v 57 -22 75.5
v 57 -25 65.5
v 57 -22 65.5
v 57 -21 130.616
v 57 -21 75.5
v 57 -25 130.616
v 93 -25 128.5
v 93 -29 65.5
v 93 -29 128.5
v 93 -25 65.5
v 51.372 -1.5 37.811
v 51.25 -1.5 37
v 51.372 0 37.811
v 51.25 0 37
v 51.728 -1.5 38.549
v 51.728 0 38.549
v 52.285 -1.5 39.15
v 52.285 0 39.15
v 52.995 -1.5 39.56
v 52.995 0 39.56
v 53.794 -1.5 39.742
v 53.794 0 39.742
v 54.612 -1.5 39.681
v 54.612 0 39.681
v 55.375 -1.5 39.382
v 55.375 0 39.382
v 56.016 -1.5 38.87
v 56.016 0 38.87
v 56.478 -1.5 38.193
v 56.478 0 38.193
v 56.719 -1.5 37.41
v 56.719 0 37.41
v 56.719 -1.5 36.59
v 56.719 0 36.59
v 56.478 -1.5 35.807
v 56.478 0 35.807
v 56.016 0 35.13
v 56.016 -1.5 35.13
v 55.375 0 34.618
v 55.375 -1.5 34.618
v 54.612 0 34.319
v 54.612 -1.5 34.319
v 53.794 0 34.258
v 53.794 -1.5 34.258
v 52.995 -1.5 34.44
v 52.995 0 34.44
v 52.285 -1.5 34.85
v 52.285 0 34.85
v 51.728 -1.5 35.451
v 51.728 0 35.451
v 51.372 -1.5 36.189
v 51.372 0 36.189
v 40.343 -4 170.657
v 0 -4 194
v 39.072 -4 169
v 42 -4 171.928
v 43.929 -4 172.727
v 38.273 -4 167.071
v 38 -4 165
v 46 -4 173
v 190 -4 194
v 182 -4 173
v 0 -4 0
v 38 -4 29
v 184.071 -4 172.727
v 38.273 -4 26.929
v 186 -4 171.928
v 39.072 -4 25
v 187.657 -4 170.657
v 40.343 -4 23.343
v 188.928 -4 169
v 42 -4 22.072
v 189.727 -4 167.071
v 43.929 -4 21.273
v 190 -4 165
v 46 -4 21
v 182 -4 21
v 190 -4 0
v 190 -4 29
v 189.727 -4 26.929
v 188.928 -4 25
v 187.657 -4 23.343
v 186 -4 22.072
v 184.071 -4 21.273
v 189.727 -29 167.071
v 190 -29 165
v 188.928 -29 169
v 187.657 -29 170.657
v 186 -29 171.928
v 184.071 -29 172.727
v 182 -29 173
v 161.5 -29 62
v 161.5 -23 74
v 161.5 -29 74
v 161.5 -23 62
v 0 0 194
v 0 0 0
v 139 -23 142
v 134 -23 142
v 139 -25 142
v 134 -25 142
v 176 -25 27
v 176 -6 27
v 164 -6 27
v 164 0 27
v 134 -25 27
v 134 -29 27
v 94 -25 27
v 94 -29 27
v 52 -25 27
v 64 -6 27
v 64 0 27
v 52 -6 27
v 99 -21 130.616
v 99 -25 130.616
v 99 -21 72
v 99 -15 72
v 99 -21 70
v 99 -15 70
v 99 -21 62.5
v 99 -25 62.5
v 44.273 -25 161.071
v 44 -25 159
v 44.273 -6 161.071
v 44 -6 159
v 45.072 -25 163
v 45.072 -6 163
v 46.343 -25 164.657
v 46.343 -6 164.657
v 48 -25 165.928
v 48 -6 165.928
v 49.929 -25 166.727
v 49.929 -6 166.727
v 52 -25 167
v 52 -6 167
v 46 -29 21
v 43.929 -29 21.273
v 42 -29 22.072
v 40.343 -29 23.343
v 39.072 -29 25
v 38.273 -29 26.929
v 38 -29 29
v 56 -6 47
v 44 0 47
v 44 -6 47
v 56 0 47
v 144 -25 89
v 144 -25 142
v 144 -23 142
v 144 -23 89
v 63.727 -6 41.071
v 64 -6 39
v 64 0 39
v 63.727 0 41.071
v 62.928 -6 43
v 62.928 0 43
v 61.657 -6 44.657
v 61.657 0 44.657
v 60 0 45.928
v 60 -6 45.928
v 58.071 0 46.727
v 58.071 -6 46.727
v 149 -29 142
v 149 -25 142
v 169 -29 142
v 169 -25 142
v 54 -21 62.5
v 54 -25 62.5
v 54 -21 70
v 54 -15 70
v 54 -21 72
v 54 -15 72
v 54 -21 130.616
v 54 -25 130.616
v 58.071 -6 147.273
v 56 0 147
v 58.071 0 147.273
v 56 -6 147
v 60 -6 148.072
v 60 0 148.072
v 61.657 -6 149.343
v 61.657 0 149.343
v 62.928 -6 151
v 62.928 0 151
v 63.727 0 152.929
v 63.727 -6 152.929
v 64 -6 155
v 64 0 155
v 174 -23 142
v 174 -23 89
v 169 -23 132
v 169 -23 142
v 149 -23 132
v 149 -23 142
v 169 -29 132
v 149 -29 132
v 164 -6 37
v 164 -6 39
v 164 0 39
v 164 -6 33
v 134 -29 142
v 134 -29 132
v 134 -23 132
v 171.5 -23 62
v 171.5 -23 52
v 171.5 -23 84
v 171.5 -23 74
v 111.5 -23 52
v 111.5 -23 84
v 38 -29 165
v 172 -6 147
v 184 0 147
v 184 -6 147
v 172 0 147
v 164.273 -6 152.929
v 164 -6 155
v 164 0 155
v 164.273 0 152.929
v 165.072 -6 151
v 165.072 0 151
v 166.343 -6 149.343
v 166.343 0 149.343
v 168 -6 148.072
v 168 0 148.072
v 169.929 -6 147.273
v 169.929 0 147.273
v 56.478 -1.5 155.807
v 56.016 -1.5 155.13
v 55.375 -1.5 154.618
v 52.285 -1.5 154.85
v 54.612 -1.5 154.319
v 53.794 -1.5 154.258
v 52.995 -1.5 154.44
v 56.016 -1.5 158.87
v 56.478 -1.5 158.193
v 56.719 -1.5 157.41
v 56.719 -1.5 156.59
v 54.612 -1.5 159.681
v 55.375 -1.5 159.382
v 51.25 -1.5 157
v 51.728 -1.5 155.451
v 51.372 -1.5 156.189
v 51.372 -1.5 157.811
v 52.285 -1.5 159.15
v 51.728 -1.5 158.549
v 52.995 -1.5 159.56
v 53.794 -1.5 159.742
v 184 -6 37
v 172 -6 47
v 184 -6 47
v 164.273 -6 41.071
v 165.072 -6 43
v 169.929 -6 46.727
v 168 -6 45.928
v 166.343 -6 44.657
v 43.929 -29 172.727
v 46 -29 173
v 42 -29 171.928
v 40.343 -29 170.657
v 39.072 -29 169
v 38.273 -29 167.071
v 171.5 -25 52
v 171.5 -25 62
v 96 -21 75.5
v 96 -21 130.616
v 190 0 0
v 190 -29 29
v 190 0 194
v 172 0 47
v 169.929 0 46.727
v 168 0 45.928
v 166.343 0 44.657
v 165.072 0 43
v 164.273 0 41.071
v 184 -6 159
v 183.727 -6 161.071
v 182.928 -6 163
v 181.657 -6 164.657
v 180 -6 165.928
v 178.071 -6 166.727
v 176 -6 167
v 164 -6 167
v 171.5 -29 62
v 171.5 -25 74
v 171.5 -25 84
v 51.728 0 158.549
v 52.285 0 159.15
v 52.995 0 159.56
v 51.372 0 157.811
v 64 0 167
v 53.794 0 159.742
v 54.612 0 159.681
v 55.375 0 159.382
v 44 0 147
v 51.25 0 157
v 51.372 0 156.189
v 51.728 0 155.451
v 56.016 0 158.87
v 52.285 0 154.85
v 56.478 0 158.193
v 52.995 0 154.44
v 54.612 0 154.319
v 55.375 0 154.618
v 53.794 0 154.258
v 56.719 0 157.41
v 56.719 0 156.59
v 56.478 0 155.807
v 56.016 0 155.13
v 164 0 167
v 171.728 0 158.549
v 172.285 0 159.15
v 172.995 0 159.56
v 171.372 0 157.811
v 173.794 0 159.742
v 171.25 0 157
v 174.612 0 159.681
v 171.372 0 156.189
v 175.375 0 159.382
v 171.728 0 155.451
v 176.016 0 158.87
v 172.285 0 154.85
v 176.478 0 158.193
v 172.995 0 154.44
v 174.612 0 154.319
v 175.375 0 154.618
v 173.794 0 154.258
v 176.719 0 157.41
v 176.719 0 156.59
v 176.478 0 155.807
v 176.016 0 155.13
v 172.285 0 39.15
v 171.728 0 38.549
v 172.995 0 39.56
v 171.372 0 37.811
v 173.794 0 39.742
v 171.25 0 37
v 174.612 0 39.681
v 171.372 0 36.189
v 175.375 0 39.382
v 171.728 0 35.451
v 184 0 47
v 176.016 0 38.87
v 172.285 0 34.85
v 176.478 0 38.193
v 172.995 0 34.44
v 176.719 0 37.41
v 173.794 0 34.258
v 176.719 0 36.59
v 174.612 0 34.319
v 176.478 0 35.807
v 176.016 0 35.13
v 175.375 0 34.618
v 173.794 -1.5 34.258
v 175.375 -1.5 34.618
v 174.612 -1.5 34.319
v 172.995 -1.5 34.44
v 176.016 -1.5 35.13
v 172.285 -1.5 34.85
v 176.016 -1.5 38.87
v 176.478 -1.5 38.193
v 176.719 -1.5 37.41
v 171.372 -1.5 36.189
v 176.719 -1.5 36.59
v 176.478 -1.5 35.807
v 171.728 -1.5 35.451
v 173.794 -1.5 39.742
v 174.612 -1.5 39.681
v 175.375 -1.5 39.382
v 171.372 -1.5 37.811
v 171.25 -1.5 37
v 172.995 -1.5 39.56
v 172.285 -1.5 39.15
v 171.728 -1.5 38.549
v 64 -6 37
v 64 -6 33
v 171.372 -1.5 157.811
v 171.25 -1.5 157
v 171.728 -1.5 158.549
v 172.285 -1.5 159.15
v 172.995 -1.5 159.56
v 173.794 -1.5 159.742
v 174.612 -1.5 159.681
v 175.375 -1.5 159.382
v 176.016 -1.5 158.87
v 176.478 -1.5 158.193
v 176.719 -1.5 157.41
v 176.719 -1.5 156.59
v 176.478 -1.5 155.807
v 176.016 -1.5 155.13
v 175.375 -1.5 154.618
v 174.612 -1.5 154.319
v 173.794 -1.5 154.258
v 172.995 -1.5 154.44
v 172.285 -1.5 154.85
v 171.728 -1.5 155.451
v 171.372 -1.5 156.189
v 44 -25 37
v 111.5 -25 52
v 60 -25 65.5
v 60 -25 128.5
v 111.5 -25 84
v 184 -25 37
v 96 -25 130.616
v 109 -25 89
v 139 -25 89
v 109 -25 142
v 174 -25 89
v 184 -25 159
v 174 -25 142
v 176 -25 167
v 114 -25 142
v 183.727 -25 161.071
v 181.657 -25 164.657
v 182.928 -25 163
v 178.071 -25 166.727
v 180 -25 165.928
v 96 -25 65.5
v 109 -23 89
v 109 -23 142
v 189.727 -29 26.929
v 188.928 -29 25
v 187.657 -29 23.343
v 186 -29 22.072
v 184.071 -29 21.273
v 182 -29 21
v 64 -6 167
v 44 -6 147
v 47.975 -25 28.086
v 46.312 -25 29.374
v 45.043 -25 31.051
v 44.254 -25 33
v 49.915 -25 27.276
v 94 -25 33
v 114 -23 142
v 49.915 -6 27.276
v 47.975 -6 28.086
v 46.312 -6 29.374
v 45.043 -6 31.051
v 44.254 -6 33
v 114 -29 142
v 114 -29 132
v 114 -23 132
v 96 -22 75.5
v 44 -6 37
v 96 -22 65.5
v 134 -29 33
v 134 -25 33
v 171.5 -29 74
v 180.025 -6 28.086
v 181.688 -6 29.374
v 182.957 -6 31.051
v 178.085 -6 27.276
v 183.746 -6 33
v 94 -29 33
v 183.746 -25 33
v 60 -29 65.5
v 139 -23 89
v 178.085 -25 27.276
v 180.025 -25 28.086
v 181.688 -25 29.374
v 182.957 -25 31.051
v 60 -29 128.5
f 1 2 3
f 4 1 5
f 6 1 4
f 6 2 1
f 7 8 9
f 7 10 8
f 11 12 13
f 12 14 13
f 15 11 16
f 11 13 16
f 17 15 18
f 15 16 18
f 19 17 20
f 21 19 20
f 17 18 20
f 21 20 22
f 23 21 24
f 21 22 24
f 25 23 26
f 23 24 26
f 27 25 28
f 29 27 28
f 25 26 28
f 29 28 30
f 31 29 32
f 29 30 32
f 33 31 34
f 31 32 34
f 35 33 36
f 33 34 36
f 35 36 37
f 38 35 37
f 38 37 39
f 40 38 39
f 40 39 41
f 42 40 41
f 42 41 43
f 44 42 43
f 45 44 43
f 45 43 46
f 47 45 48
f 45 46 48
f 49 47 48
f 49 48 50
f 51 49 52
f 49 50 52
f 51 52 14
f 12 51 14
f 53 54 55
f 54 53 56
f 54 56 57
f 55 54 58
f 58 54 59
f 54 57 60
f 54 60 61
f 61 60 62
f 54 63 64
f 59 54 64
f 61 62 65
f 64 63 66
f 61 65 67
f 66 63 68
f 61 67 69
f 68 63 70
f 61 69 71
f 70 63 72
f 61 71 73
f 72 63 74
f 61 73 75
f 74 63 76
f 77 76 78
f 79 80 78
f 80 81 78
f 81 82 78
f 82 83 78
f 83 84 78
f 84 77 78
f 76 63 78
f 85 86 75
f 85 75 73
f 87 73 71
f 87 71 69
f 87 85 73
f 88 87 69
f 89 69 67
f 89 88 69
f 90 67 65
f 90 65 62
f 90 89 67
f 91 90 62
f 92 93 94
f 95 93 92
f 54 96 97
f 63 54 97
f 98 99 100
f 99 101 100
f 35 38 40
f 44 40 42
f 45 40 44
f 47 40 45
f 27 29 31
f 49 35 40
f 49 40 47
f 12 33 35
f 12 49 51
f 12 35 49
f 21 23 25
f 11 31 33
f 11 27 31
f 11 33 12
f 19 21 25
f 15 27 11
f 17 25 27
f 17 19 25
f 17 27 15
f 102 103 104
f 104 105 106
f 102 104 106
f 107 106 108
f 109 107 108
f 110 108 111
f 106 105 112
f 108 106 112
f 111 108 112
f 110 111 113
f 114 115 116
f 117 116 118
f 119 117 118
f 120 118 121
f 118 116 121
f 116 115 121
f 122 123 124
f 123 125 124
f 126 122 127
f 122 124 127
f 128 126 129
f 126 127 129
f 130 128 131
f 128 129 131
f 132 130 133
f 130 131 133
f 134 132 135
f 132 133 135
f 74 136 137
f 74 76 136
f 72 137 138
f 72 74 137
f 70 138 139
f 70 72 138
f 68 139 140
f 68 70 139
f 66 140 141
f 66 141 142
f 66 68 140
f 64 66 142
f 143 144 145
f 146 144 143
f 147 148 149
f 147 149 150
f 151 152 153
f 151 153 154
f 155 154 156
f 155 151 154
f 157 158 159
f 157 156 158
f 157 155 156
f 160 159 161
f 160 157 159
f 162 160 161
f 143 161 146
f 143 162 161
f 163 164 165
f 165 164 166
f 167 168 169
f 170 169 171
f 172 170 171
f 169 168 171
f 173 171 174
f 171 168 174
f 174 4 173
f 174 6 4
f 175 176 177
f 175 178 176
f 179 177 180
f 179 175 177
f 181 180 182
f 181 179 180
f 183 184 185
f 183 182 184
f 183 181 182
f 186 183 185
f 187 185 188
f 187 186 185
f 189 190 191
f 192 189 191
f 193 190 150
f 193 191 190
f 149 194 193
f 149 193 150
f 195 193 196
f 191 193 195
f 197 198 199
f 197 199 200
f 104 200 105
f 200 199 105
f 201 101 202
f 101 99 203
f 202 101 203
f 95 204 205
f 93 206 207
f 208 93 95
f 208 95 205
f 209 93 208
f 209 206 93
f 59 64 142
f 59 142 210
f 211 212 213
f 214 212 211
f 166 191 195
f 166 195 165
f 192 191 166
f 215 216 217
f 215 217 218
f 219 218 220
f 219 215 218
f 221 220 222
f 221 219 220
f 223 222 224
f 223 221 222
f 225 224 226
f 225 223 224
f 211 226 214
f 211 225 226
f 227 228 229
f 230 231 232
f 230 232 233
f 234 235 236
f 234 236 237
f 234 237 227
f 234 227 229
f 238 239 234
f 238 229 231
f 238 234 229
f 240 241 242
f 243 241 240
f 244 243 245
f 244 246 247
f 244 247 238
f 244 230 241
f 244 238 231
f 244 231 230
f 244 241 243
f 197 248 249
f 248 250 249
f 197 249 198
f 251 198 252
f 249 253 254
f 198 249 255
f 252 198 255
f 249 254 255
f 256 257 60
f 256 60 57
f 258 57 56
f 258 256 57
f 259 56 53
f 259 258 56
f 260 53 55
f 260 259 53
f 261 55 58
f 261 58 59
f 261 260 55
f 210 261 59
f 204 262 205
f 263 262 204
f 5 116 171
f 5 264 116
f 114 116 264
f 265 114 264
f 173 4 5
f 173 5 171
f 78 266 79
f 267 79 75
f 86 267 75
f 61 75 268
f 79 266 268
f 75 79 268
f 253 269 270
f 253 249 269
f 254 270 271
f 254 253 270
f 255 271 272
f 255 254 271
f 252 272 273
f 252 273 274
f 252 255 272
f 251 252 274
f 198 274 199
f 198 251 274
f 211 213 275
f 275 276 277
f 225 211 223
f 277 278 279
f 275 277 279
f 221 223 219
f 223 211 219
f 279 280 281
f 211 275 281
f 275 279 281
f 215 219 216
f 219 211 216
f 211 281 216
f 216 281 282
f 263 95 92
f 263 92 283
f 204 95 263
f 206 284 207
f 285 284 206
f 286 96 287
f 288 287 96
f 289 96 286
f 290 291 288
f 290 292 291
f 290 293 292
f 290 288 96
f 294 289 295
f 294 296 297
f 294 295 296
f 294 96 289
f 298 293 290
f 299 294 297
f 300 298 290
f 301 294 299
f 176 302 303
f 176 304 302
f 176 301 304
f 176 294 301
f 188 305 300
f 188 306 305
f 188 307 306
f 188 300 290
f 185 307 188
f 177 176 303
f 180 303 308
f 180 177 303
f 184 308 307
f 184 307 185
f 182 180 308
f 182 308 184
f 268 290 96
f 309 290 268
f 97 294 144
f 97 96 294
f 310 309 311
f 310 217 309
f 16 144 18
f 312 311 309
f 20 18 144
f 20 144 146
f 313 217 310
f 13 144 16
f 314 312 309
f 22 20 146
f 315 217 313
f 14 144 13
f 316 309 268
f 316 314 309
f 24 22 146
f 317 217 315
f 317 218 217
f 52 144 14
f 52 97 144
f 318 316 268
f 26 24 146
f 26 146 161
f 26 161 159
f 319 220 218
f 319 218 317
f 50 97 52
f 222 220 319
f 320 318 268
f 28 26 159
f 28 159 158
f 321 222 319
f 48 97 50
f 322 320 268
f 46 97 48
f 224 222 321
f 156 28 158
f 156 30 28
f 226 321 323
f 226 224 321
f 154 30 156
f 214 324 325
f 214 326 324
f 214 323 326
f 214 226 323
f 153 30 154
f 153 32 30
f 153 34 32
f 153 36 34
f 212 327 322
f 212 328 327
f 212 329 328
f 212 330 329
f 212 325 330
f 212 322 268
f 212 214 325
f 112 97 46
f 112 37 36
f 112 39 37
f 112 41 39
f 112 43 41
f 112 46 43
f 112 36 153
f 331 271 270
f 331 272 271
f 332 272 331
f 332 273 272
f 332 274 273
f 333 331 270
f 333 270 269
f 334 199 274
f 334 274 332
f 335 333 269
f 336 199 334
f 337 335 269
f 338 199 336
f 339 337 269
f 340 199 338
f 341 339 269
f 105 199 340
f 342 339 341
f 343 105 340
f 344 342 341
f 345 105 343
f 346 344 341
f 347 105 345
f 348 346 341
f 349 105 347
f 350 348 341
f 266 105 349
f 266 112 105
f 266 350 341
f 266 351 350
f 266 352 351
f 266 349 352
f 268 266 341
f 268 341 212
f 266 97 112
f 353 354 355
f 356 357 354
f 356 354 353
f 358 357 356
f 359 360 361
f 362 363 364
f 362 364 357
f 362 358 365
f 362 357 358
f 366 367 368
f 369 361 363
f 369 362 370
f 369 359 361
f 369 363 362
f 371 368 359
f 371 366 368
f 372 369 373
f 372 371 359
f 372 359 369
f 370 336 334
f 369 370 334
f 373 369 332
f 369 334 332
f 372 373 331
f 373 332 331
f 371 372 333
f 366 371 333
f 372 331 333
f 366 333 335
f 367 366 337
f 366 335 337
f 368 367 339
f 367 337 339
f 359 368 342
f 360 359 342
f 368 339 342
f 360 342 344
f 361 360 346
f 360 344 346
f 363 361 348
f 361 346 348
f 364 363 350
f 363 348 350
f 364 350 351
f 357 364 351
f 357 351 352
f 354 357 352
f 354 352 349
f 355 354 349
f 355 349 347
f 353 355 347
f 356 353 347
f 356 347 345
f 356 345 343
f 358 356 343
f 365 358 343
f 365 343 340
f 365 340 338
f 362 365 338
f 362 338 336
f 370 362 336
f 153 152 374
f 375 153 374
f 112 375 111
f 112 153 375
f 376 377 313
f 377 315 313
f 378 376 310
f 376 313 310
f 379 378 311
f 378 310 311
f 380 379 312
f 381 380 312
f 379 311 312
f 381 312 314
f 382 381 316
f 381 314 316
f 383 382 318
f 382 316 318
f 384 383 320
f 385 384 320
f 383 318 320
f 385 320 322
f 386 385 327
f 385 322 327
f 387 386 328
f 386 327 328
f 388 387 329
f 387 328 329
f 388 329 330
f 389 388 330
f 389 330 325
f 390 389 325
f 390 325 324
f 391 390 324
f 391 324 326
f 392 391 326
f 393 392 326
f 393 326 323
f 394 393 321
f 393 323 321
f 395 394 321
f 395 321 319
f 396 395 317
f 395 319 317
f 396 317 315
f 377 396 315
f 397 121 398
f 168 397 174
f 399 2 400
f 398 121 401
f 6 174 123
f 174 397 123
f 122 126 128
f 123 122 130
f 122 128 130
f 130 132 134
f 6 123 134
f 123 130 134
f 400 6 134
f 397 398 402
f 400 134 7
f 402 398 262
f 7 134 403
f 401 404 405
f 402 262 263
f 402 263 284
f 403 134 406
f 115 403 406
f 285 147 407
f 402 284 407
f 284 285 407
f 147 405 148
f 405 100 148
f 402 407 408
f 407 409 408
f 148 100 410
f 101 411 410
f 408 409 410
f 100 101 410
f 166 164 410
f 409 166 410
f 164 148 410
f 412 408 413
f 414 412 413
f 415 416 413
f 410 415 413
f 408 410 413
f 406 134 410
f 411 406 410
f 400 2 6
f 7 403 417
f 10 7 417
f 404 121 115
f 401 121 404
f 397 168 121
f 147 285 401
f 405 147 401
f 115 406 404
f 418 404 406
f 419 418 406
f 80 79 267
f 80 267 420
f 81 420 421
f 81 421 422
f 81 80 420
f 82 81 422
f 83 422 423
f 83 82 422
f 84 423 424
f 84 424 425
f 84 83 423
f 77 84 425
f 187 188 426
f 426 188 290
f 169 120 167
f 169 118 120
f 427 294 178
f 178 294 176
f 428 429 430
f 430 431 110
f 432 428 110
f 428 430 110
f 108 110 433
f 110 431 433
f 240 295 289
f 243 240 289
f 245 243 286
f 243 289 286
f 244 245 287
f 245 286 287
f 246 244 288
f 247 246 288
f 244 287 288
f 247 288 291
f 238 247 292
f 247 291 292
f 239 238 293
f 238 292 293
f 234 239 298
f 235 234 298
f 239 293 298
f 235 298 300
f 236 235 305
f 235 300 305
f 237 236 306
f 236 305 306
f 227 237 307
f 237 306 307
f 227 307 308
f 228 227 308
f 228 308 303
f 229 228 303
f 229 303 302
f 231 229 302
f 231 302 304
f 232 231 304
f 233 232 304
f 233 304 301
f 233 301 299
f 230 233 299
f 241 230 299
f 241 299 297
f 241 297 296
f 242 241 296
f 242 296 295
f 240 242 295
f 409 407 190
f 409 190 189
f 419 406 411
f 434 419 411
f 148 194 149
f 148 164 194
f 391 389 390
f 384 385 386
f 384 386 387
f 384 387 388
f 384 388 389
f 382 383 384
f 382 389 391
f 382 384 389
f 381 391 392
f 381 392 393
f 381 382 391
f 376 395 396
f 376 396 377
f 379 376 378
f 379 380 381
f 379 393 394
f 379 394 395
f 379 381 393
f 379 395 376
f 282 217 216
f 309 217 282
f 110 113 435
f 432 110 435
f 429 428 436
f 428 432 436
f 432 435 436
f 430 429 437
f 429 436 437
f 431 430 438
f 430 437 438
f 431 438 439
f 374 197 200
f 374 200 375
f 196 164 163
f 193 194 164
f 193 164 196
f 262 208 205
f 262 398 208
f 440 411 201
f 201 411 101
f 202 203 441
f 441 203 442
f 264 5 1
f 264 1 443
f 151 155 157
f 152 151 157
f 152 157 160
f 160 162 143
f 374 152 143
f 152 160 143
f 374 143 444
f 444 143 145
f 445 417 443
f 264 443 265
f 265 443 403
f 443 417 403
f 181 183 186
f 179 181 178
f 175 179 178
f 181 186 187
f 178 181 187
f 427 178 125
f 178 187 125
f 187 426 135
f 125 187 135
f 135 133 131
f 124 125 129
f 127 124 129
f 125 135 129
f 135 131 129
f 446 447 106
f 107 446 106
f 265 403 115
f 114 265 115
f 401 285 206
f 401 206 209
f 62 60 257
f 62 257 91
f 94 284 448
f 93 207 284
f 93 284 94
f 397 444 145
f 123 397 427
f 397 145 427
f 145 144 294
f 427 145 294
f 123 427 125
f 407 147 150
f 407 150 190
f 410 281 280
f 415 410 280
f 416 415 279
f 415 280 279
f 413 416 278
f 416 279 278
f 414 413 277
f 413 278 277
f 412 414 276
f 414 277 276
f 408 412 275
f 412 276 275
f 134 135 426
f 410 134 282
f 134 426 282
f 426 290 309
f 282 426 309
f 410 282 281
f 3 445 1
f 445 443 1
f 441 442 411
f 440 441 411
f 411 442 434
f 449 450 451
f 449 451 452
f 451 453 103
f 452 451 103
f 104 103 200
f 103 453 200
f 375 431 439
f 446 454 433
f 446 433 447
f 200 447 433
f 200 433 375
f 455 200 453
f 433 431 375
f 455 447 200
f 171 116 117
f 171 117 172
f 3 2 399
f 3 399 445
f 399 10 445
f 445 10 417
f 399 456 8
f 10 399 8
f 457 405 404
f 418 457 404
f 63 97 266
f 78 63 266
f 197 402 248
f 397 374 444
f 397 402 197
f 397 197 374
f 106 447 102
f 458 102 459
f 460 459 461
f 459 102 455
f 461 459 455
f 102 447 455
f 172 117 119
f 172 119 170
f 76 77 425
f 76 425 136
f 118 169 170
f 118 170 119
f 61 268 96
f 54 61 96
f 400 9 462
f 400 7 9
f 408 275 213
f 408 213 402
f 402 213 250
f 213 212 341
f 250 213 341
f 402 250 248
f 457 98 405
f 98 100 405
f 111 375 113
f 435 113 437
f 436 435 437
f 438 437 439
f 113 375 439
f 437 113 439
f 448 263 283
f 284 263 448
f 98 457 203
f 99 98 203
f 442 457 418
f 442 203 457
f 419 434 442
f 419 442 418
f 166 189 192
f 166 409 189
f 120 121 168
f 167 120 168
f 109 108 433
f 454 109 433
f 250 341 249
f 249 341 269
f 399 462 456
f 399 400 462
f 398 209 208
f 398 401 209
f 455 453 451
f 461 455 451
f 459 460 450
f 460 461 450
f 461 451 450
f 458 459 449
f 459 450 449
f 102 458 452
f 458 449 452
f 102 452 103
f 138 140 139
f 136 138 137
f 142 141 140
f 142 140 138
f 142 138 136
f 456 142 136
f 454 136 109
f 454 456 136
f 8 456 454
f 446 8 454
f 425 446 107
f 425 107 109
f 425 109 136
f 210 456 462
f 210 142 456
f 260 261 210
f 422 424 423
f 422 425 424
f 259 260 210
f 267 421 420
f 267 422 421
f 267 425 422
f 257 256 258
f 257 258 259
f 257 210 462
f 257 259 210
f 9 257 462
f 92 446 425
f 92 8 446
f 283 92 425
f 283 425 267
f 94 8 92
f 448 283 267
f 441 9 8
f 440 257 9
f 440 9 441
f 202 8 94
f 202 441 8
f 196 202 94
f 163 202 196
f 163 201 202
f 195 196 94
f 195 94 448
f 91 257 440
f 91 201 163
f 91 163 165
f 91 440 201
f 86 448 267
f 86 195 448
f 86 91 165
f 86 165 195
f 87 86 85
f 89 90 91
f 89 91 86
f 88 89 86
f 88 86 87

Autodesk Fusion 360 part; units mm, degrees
sketch "Sketch1" plane through (0, 0, 0) normal (0, 1, 0) x (1, 0, 0)
  line L0 (0, 0) -> (190, 0)
  line L1 (190, 0) -> (190, -194)
  line L2 (190, -194) -> (0, -194)
  line L3 (0, -194) -> (0, 0)
  dimension "d1" = 190
  dimension "d2" = 194
extrude "Extrude1" add sketch "Sketch1" against normal blind 4
sketch "Sketch2" plane through (0, -4, 0) normal (0, -1, 0) x (1, 0, 0)
  line L0 (190, 194) -> (0, 194)
  line L1 (0, 194) -> (0, 0)
  line L2 (0, 0) -> (190, 0)
  line L3 (190, 0) -> (190, 194)
  line L4 (44, 167) -> (184, 167)
  line L5 (184, 167) -> (184, 27)
  line L6 (184, 27) -> (44, 27)
  line L7 (44, 27) -> (44, 167)
  dimension "d5" = 44
  dimension "d6" = 140
  dimension "d7" = 27
  dimension "d8" = 140
extrude "Extrude2" cut sketch "Sketch2" against normal blind 4 contours L4 L5 L6 L7
fillet "Fillet1" radius 8 4 edges at (44, -2, 167) (44, -2, 27) (184, -2, 167) (184, -2, 27)
sketch "Sketch3" plane through (0, -4, 0) normal (0, -1, 0) x (1, 0, 0)
  line L0 (184, 159) -> (184, 35)
  arc A0 (176, 27) -> (184, 35) centre (176, 35) ccw
  line L1 (176, 27) -> (52, 27)
  arc A1 (44, 35) -> (52, 27) centre (52, 35) ccw
  line L2 (44, 35) -> (44, 159)
  arc A2 (52, 167) -> (44, 159) centre (52, 159) ccw
  line L3 (52, 167) -> (176, 167)
  arc A3 (184, 159) -> (176, 167) centre (176, 159) ccw
  line L4 (190, 194) -> (0, 194)
  line L5 (0, 194) -> (0, 0)
  line L6 (0, 0) -> (190, 0)
  line L7 (190, 0) -> (190, 194)
  line L8 (38, 173) -> (190, 173)
  line L9 (190, 173) -> (190, 21)
  line L10 (190, 21) -> (38, 21)
  line L11 (38, 21) -> (38, 173)
  dimension "d13" = 6
  dimension "d14" = 6
  dimension "d15" = 6
  dimension "d16" = 6
extrude "Extrude3" add sketch "Sketch3" along normal blind 21 contours L7 L8 L9 L10 L11
sketch "Sketch4" plane through (0, -25, 0) normal (0, -1, 0) x (1, 0, 0)
  arc A0 (176, 27) -> (184, 35) centre (176, 35) ccw
  line L0 (176, 27) -> (52, 27)
  arc A1 (44, 35) -> (52, 27) centre (52, 35) ccw
  line L1 (44, 35) -> (44, 159)
  arc A2 (52, 167) -> (44, 159) centre (52, 159) ccw
  line L2 (52, 167) -> (176, 167)
  arc A3 (184, 159) -> (176, 167) centre (176, 159) ccw
  line L3 (184, 159) -> (184, 35)
  line L4 (38, 21) -> (190, 21)
  line L5 (190, 21) -> (190, 173)
  line L6 (190, 173) -> (38, 173)
  line L7 (38, 173) -> (38, 21)
  line L8 (38, 173) -> (190, 173)
  line L9 (190, 173) -> (190, 21)
  line L10 (190, 21) -> (38, 21)
  line L11 (38, 21) -> (38, 173)
extrude "Extrude4" add sketch "Sketch4" along normal blind 4 contours A0 L0 A1 L1 A2 L2 A3 L3 | L4 L5 L6 L7 L8 L9 L10 L11
fillet "Fillet2" radius 8 4 edges at (38, -16.5, 173) (190, -16.5, 173) (38, -16.5, 21) (190, -16.5, 21)
sketch "Sketch5" plane through (0, 0, 0) normal (0, 1, 0) x (-1, 0, 0)
  line L0 (-184, 35) -> (-184, 159)
  arc A0 (-176, 167) -> (-184, 159) centre (-176, 159) ccw
  line L1 (-176, 167) -> (-52, 167)
  arc A1 (-44, 159) -> (-52, 167) centre (-52, 159) ccw
  line L2 (-44, 159) -> (-44, 35)
  arc A2 (-52, 27) -> (-44, 35) centre (-52, 35) ccw
  line L3 (-52, 27) -> (-176, 27)
  arc A3 (-184, 35) -> (-176, 27) centre (-176, 35) ccw
  line L4 (0, 194) -> (-190, 194)
  line L5 (-190, 194) -> (-190, 0)
  line L6 (-190, 0) -> (0, 0)
  line L7 (0, 0) -> (0, 194)
  line L8 (-64, 167) -> (-44, 167)
  line L9 (-44, 167) -> (-44, 147)
  line L10 (-44, 147) -> (-64, 147)
  line L11 (-64, 147) -> (-64, 167)
  circle A4 centre (-54, 157) radius 2.75
  line L12 (-164, 167) -> (-184, 167)
  line L13 (-184, 167) -> (-184, 147)
  line L14 (-184, 147) -> (-164, 147)
  line L15 (-164, 147) -> (-164, 167)
  line L16 (-184, 47) -> (-164, 47)
  line L17 (-164, 47) -> (-164, 27)
  line L18 (-164, 27) -> (-184, 27)
  line L19 (-184, 27) -> (-184, 47)
  line L20 (-44, 47) -> (-64, 47)
  line L21 (-64, 47) -> (-64, 27)
  line L22 (-64, 27) -> (-44, 27)
  line L23 (-44, 27) -> (-44, 47)
  circle A5 centre (-174, 157) radius 2.75
  circle A6 centre (-174, 37) radius 2.75
  circle A7 centre (-54, 37) radius 2.75
  dimension "d23" = 5.5
  dimension "d24" = 10
  dimension "d25" = 10
  dimension "d26" = 10
  dimension "d27" = 10
  dimension "d28" = 5.5
  dimension "d29" = 10
  dimension "d30" = 10
  dimension "d31" = 10
  dimension "d32" = 10
  dimension "d33" = 5.5
  dimension "d34" = 5.5
  dimension "d35" = 10
  dimension "d36" = 10
  dimension "d37" = 10
  dimension "d38" = 10
  dimension "d39" = 10
  dimension "d40" = 10
  dimension "d41" = 10
  dimension "d42" = 10
extrude "Extrude5" add sketch "Sketch5" against normal blind 6 contours L0 L3 A3 L16 L17 L18 L19 | A3 L18 L19 | L0 A0 L1 L12 L13 L14 L15 | A0 L12 L13 | L2 A2 L3 L20 L21 L22 L23 | A2 L22 L23 | L1 A1 L2 L8 L9 L10 L11 | A1 L8 L9 | A4 | A5 | A6 | A7
extrude "Extrude6" cut sketch "Sketch5" against normal blind 1.5 contours A4 | A5 | A6 | A7
fillet "Fillet3" radius 8 4 edges at (164, -3, 147) (164, -3, 47) (64, -3, 47) (64, -3, 147)
sketch "Sketch6" plane through (0, -25, 0) normal (0, 1, 0) x (-1, 0, 0)
  arc A0 (-52, 27) -> (-44, 35) centre (-52, 35) ccw
  line L0 (-44, 35) -> (-44, 159)
  arc A1 (-44, 159) -> (-52, 167) centre (-52, 159) ccw
  line L1 (-52, 167) -> (-176, 167)
  arc A2 (-176, 167) -> (-184, 159) centre (-176, 159) ccw
  line L2 (-184, 159) -> (-184, 35)
  arc A3 (-184, 35) -> (-176, 27) centre (-176, 35) ccw
  line L3 (-176, 27) -> (-52, 27)
  line L4 (-93, 128.5) -> (-60, 128.5)
  line L5 (-60, 128.5) -> (-60, 65.5)
  line L6 (-60, 65.5) -> (-93, 65.5)
  line L7 (-93, 65.5) -> (-93, 128.5)
  dimension "d51" = 63
  dimension "d54" = 33
  dimension "d88" = 16
  dimension "d92" = 38.5
extrude "Extrude7" cut sketch "Sketch6" against normal blind 4 contours L4 L5 L6 L7
sketch "Sketch7" plane through (0, -25, 0) normal (0, 1, 0) x (-1, 0, 0)
  line L0 (-60, 128.5) -> (-60, 65.5)
  line L1 (-60, 65.5) -> (-93, 65.5)
  line L2 (-93, 65.5) -> (-93, 128.5)
  line L3 (-93, 128.5) -> (-60, 128.5)
  arc A0 (-52, 27) -> (-44, 35) centre (-52, 35) ccw
  line L4 (-44, 35) -> (-44, 159)
  arc A1 (-44, 159) -> (-52, 167) centre (-52, 159) ccw
  line L5 (-52, 167) -> (-176, 167)
  arc A2 (-176, 167) -> (-184, 159) centre (-176, 159) ccw
  line L6 (-184, 159) -> (-184, 35)
  arc A3 (-184, 35) -> (-176, 27) centre (-176, 35) ccw
  line L7 (-176, 27) -> (-52, 27)
  line L8 (-96, 130.6162) -> (-99, 130.6162)
  line L9 (-99, 130.6162) -> (-99, 62.5)
  line L10 (-99, 62.5) -> (-96, 62.5)
  line L11 (-96, 62.5) -> (-96, 130.6162)
  line L12 (-96, 62.5) -> (-54, 62.5)
  line L13 (-54, 62.5) -> (-54, 65.5)
  line L14 (-54, 65.5) -> (-96, 65.5)
  line L15 (-96, 65.5) -> (-96, 62.5)
  line L16 (-54, 65.5) -> (-57, 65.5)
  line L17 (-57, 65.5) -> (-57, 130.6162)
  line L18 (-57, 130.6162) -> (-54, 130.6162)
  line L19 (-54, 130.6162) -> (-54, 65.5)
  dimension "d55" = 3
  dimension "d56" = 3
  dimension "d57" = 3
  dimension "d58" = 3
  dimension "d59" = 3
extrude "Extrude8" add sketch "Sketch7" along normal blind 4 contours L1 L11 L12 L13 L14 L15 L16 | L14 L16 L17 L18 L19 | L8 L9 L10 L11 L15
sketch "Sketch8" plane through (0, -25, 0) normal (0, 1, 0) x (-1, 0, 0)
  line L0 (-96, 65.5) -> (-93, 65.5)
  line L1 (-93, 65.5) -> (-93, 128.5)
  line L2 (-93, 128.5) -> (-60, 128.5)
  line L3 (-60, 128.5) -> (-60, 65.5)
  line L4 (-60, 65.5) -> (-57, 65.5)
  line L5 (-57, 65.5) -> (-57, 130.6162)
  line L6 (-57, 130.6162) -> (-54, 130.6162)
  line L7 (-54, 130.6162) -> (-54, 62.5)
  line L8 (-54, 62.5) -> (-99, 62.5)
  line L9 (-99, 62.5) -> (-99, 130.6162)
  line L10 (-99, 130.6162) -> (-96, 130.6162)
  line L11 (-96, 130.6162) -> (-96, 65.5)
  arc A0 (-52, 27) -> (-44, 35) centre (-52, 35) ccw
  line L12 (-44, 35) -> (-44, 159)
  arc A1 (-44, 159) -> (-52, 167) centre (-52, 159) ccw
  line L13 (-52, 167) -> (-176, 167)
  arc A2 (-176, 167) -> (-184, 159) centre (-176, 159) ccw
  line L14 (-184, 159) -> (-184, 35)
  arc A3 (-184, 35) -> (-176, 27) centre (-176, 35) ccw
  line L15 (-176, 27) -> (-52, 27)
  line L16 (-174, 142) -> (-144, 142)
  line L17 (-144, 142) -> (-144, 89)
  line L18 (-144, 89) -> (-174, 89)
  line L19 (-174, 89) -> (-174, 142)
  line L20 (-109, 142) -> (-139, 142)
  line L21 (-139, 142) -> (-139, 89)
  line L22 (-139, 89) -> (-109, 89)
  line L23 (-109, 89) -> (-109, 142)
  line L24 (-171.5, 84) -> (-111.5, 84)
  line L25 (-111.5, 84) -> (-111.5, 52)
  line L26 (-111.5, 52) -> (-171.5, 52)
  line L27 (-171.5, 52) -> (-171.5, 84)
  dimension "d60" = 30
  dimension "d61" = 53
  dimension "d64" = 30
  dimension "d65" = 53
  dimension "d66" = 60
  dimension "d67" = 32
  dimension "d86" = 5
  dimension "d87" = 25
  dimension "d89" = 10
  dimension "d90" = 5
  dimension "d91" = 2.5
extrude "Extrude9" add sketch "Sketch8" along normal blind 2 contours L16 L17 L18 L19 | L20 L21 L22 L23 | L24 L25 L26 L27
sketch "Sketch9" plane through (0, -25, 0) normal (0, 1, 0) x (-1, 0, 0)
  line L0 (-171.5, 52) -> (-171.5, 84)
  line L1 (-171.5, 84) -> (-111.5, 84)
  line L2 (-111.5, 84) -> (-111.5, 52)
  line L3 (-111.5, 52) -> (-171.5, 52)
  line L4 (-109, 89) -> (-139, 89)
  line L5 (-139, 89) -> (-139, 142)
  line L6 (-139, 142) -> (-109, 142)
  line L7 (-109, 142) -> (-109, 89)
  line L8 (-174, 89) -> (-174, 142)
  line L9 (-174, 142) -> (-144, 142)
  line L10 (-144, 142) -> (-144, 89)
  line L11 (-144, 89) -> (-174, 89)
  line L12 (-96, 65.5) -> (-93, 65.5)
  line L13 (-93, 65.5) -> (-93, 128.5)
  line L14 (-93, 128.5) -> (-60, 128.5)
  line L15 (-60, 128.5) -> (-60, 65.5)
  line L16 (-60, 65.5) -> (-57, 65.5)
  line L17 (-57, 65.5) -> (-57, 130.6162)
  line L18 (-57, 130.6162) -> (-54, 130.6162)
  line L19 (-54, 130.6162) -> (-54, 62.5)
  line L20 (-54, 62.5) -> (-99, 62.5)
  line L21 (-99, 62.5) -> (-99, 130.6162)
  line L22 (-99, 130.6162) -> (-96, 130.6162)
  line L23 (-96, 130.6162) -> (-96, 65.5)
  arc A0 (-52, 27) -> (-44, 35) centre (-52, 35) ccw
  line L24 (-44, 35) -> (-44, 159)
  arc A1 (-44, 159) -> (-52, 167) centre (-52, 159) ccw
  line L25 (-52, 167) -> (-176, 167)
  arc A2 (-176, 167) -> (-184, 159) centre (-176, 159) ccw
  line L26 (-184, 159) -> (-184, 35)
  arc A3 (-184, 35) -> (-176, 27) centre (-176, 35) ccw
  line L27 (-176, 27) -> (-52, 27)
  line L28 (-134, 27) -> (-94, 27)
  line L29 (-94, 27) -> (-94, 33)
  line L30 (-94, 33) -> (-134, 33)
  line L31 (-134, 33) -> (-134, 27)
  dimension "d68" = 6
  dimension "d70" = 50
  dimension "d71" = 50
  dimension "d103" = 40
extrude "Extrude10" cut sketch "Sketch9" against normal blind 4 contours L27 L28 L29 L30 L31
sketch "Sketch10" plane through (0, -25, 0) normal (0, 1, 0) x (-1, 0, 0)
  line L0 (-134, 27) -> (-134, 33)
  line L1 (-134, 33) -> (-94, 33)
  line L2 (-94, 33) -> (-94, 27)
  line L3 (-94, 27) -> (-52, 27)
  arc A0 (-52, 27) -> (-44, 35) centre (-52, 35) ccw
  line L4 (-44, 35) -> (-44, 159)
  arc A1 (-44, 159) -> (-52, 167) centre (-52, 159) ccw
  line L5 (-52, 167) -> (-176, 167)
  arc A2 (-176, 167) -> (-184, 159) centre (-176, 159) ccw
  line L6 (-184, 159) -> (-184, 35)
  arc A3 (-184, 35) -> (-176, 27) centre (-176, 35) ccw
  line L7 (-176, 27) -> (-134, 27)
  line L8 (-96, 65.5) -> (-93, 65.5)
  line L9 (-93, 65.5) -> (-93, 128.5)
  line L10 (-93, 128.5) -> (-60, 128.5)
  line L11 (-60, 128.5) -> (-60, 65.5)
  line L12 (-60, 65.5) -> (-57, 65.5)
  line L13 (-57, 65.5) -> (-57, 130.6162)
  line L14 (-57, 130.6162) -> (-54, 130.6162)
  line L15 (-54, 130.6162) -> (-54, 62.5)
  line L16 (-54, 62.5) -> (-99, 62.5)
  line L17 (-99, 62.5) -> (-99, 130.6162)
  line L18 (-99, 130.6162) -> (-96, 130.6162)
  line L19 (-96, 130.6162) -> (-96, 65.5)
  line L20 (-174, 89) -> (-174, 142)
  line L21 (-174, 142) -> (-144, 142)
  line L22 (-144, 142) -> (-144, 89)
  line L23 (-144, 89) -> (-174, 89)
  line L24 (-109, 89) -> (-139, 89)
  line L25 (-139, 89) -> (-139, 142)
  line L26 (-139, 142) -> (-109, 142)
  line L27 (-109, 142) -> (-109, 89)
  line L28 (-171.5, 52) -> (-171.5, 84)
  line L29 (-171.5, 84) -> (-111.5, 84)
  line L30 (-111.5, 84) -> (-111.5, 52)
  line L31 (-111.5, 52) -> (-171.5, 52)
  line L32 (-184, 37) -> (-44, 37)
  line L33 (-44, 37) -> (-44, 33)
  line L34 (-44, 33) -> (-184, 33)
  line L35 (-184, 33) -> (-184, 37)
  dimension "d74" = 4
extrude "Extrude11" add sketch "Sketch10" along normal blind 19 contours L1 A0 L4 L6 A3 L32 L33 L34 L35 | A3 L34 L35 | A0 L33 L34
sketch "Sketch11" plane through (0, -23, 0) normal (0, 1, 0) x (-1, 0, 0)
  line L0 (-174, 89) -> (-144, 89)
  line L1 (-144, 89) -> (-144, 142)
  line L2 (-144, 142) -> (-174, 142)
  line L3 (-174, 142) -> (-174, 89)
  line L4 (-169, 142) -> (-149, 142)
  line L5 (-149, 142) -> (-149, 132)
  line L6 (-149, 132) -> (-169, 132)
  line L7 (-169, 132) -> (-169, 142)
  line L8 (-134, 132) -> (-114, 132)
  line L9 (-114, 132) -> (-114, 142)
  line L10 (-114, 142) -> (-134, 142)
  line L11 (-134, 142) -> (-134, 132)
  line L12 (-171.5, 74) -> (-161.5, 74)
  line L13 (-161.5, 74) -> (-161.5, 62)
  line L14 (-161.5, 62) -> (-171.5, 62)
  line L15 (-171.5, 62) -> (-171.5, 74)
  line L16 (-171.5, 84) -> (-171.5, 52)
  line L17 (-111.5, 84) -> (-171.5, 84)
  line L18 (-171.5, 52) -> (-111.5, 52)
  line L19 (-111.5, 52) -> (-111.5, 84)
  line L20 (-111.5, 84) -> (-171.5, 84)
  line L21 (-171.5, 84) -> (-171.5, 52)
  line L22 (-109, 142) -> (-139, 142)
  line L23 (-109, 89) -> (-109, 142)
  line L24 (-139, 142) -> (-139, 89)
  dimension "d93" = 10
  dimension "d94" = 10
  dimension "d95" = 10
  dimension "d96" = 5
  dimension "d97" = 5
  dimension "d98" = 10
  dimension "d100" = 10
  dimension "d101" = 5
  dimension "d102" = 5
extrude "Extrude12" cut sketch "Sketch11" against normal blind 6 contours L2 L4 L5 L6 L7 | L8 L9 L10 L11 L22 | L12 L13 L14 L15 L16 L21
sketch "Sketch12" plane through (0, -21, 0) normal (0, 1, 0) x (-1, 0, 0)
  line L0 (-57, 65.5) -> (-96, 65.5)
  line L1 (-96, 65.5) -> (-96, 130.6162)
  line L2 (-96, 130.6162) -> (-99, 130.6162)
  line L3 (-99, 130.6162) -> (-99, 62.5)
  line L4 (-99, 62.5) -> (-54, 62.5)
  line L5 (-54, 62.5) -> (-54, 130.6162)
  line L6 (-54, 130.6162) -> (-57, 130.6162)
  line L7 (-57, 130.6162) -> (-57, 65.5)
  line L8 (-99, 62.5) -> (-54, 62.5)
  line L9 (-54, 62.5) -> (-54, 75.5)
  line L10 (-54, 75.5) -> (-99, 75.5)
  line L11 (-99, 75.5) -> (-99, 62.5)
  dimension "d79" = 10
extrude "Extrude13" add sketch "Sketch12" against normal blind 1 contours L0 L1 L3 L4 L5 L7 L8 L9 L10 L11 | L0 L1 L7 L10
sketch "Sketch13" plane through (0, -21, 0) normal (0, 1, 0) x (-1, 0, 0)
  line L0 (-54, 62.5) -> (-54, 130.6162)
  line L1 (-54, 130.6162) -> (-57, 130.6162)
  line L2 (-57, 130.6162) -> (-57, 75.5)
  line L3 (-57, 75.5) -> (-96, 75.5)
  line L4 (-96, 75.5) -> (-96, 130.6162)
  line L5 (-96, 130.6162) -> (-99, 130.6162)
  line L6 (-99, 130.6162) -> (-99, 62.5)
  line L7 (-99, 62.5) -> (-54, 62.5)
  line L8 (-99, 72) -> (-54, 72)
  line L9 (-54, 72) -> (-54, 70)
  line L10 (-54, 70) -> (-99, 70)
  line L11 (-99, 70) -> (-99, 72)
  dimension "d82" = 2
extrude "Extrude14" add sketch "Sketch13" along normal blind 6 contours L0 L6 L8 L9 L10 L11
equation "d1 = 184 mm + ( ( 12 / 2 ) * 1 mm )"
equation "d2 = 140 mm + ( ( 2 * 27 ) * 1 mm )"
equation "d24 = 7.25 mm + ( ( 5.5 / 2 ) * 1 mm )"
equation "d25 = 7.25 mm + ( ( 5.5 / 2 ) * 1 mm )"
equation "d55 = ( ( 39 - 33 ) / 2 ) * 1 mm"
equation "d56 = ( ( 39 - 33 ) / 2 ) * 1 mm"
